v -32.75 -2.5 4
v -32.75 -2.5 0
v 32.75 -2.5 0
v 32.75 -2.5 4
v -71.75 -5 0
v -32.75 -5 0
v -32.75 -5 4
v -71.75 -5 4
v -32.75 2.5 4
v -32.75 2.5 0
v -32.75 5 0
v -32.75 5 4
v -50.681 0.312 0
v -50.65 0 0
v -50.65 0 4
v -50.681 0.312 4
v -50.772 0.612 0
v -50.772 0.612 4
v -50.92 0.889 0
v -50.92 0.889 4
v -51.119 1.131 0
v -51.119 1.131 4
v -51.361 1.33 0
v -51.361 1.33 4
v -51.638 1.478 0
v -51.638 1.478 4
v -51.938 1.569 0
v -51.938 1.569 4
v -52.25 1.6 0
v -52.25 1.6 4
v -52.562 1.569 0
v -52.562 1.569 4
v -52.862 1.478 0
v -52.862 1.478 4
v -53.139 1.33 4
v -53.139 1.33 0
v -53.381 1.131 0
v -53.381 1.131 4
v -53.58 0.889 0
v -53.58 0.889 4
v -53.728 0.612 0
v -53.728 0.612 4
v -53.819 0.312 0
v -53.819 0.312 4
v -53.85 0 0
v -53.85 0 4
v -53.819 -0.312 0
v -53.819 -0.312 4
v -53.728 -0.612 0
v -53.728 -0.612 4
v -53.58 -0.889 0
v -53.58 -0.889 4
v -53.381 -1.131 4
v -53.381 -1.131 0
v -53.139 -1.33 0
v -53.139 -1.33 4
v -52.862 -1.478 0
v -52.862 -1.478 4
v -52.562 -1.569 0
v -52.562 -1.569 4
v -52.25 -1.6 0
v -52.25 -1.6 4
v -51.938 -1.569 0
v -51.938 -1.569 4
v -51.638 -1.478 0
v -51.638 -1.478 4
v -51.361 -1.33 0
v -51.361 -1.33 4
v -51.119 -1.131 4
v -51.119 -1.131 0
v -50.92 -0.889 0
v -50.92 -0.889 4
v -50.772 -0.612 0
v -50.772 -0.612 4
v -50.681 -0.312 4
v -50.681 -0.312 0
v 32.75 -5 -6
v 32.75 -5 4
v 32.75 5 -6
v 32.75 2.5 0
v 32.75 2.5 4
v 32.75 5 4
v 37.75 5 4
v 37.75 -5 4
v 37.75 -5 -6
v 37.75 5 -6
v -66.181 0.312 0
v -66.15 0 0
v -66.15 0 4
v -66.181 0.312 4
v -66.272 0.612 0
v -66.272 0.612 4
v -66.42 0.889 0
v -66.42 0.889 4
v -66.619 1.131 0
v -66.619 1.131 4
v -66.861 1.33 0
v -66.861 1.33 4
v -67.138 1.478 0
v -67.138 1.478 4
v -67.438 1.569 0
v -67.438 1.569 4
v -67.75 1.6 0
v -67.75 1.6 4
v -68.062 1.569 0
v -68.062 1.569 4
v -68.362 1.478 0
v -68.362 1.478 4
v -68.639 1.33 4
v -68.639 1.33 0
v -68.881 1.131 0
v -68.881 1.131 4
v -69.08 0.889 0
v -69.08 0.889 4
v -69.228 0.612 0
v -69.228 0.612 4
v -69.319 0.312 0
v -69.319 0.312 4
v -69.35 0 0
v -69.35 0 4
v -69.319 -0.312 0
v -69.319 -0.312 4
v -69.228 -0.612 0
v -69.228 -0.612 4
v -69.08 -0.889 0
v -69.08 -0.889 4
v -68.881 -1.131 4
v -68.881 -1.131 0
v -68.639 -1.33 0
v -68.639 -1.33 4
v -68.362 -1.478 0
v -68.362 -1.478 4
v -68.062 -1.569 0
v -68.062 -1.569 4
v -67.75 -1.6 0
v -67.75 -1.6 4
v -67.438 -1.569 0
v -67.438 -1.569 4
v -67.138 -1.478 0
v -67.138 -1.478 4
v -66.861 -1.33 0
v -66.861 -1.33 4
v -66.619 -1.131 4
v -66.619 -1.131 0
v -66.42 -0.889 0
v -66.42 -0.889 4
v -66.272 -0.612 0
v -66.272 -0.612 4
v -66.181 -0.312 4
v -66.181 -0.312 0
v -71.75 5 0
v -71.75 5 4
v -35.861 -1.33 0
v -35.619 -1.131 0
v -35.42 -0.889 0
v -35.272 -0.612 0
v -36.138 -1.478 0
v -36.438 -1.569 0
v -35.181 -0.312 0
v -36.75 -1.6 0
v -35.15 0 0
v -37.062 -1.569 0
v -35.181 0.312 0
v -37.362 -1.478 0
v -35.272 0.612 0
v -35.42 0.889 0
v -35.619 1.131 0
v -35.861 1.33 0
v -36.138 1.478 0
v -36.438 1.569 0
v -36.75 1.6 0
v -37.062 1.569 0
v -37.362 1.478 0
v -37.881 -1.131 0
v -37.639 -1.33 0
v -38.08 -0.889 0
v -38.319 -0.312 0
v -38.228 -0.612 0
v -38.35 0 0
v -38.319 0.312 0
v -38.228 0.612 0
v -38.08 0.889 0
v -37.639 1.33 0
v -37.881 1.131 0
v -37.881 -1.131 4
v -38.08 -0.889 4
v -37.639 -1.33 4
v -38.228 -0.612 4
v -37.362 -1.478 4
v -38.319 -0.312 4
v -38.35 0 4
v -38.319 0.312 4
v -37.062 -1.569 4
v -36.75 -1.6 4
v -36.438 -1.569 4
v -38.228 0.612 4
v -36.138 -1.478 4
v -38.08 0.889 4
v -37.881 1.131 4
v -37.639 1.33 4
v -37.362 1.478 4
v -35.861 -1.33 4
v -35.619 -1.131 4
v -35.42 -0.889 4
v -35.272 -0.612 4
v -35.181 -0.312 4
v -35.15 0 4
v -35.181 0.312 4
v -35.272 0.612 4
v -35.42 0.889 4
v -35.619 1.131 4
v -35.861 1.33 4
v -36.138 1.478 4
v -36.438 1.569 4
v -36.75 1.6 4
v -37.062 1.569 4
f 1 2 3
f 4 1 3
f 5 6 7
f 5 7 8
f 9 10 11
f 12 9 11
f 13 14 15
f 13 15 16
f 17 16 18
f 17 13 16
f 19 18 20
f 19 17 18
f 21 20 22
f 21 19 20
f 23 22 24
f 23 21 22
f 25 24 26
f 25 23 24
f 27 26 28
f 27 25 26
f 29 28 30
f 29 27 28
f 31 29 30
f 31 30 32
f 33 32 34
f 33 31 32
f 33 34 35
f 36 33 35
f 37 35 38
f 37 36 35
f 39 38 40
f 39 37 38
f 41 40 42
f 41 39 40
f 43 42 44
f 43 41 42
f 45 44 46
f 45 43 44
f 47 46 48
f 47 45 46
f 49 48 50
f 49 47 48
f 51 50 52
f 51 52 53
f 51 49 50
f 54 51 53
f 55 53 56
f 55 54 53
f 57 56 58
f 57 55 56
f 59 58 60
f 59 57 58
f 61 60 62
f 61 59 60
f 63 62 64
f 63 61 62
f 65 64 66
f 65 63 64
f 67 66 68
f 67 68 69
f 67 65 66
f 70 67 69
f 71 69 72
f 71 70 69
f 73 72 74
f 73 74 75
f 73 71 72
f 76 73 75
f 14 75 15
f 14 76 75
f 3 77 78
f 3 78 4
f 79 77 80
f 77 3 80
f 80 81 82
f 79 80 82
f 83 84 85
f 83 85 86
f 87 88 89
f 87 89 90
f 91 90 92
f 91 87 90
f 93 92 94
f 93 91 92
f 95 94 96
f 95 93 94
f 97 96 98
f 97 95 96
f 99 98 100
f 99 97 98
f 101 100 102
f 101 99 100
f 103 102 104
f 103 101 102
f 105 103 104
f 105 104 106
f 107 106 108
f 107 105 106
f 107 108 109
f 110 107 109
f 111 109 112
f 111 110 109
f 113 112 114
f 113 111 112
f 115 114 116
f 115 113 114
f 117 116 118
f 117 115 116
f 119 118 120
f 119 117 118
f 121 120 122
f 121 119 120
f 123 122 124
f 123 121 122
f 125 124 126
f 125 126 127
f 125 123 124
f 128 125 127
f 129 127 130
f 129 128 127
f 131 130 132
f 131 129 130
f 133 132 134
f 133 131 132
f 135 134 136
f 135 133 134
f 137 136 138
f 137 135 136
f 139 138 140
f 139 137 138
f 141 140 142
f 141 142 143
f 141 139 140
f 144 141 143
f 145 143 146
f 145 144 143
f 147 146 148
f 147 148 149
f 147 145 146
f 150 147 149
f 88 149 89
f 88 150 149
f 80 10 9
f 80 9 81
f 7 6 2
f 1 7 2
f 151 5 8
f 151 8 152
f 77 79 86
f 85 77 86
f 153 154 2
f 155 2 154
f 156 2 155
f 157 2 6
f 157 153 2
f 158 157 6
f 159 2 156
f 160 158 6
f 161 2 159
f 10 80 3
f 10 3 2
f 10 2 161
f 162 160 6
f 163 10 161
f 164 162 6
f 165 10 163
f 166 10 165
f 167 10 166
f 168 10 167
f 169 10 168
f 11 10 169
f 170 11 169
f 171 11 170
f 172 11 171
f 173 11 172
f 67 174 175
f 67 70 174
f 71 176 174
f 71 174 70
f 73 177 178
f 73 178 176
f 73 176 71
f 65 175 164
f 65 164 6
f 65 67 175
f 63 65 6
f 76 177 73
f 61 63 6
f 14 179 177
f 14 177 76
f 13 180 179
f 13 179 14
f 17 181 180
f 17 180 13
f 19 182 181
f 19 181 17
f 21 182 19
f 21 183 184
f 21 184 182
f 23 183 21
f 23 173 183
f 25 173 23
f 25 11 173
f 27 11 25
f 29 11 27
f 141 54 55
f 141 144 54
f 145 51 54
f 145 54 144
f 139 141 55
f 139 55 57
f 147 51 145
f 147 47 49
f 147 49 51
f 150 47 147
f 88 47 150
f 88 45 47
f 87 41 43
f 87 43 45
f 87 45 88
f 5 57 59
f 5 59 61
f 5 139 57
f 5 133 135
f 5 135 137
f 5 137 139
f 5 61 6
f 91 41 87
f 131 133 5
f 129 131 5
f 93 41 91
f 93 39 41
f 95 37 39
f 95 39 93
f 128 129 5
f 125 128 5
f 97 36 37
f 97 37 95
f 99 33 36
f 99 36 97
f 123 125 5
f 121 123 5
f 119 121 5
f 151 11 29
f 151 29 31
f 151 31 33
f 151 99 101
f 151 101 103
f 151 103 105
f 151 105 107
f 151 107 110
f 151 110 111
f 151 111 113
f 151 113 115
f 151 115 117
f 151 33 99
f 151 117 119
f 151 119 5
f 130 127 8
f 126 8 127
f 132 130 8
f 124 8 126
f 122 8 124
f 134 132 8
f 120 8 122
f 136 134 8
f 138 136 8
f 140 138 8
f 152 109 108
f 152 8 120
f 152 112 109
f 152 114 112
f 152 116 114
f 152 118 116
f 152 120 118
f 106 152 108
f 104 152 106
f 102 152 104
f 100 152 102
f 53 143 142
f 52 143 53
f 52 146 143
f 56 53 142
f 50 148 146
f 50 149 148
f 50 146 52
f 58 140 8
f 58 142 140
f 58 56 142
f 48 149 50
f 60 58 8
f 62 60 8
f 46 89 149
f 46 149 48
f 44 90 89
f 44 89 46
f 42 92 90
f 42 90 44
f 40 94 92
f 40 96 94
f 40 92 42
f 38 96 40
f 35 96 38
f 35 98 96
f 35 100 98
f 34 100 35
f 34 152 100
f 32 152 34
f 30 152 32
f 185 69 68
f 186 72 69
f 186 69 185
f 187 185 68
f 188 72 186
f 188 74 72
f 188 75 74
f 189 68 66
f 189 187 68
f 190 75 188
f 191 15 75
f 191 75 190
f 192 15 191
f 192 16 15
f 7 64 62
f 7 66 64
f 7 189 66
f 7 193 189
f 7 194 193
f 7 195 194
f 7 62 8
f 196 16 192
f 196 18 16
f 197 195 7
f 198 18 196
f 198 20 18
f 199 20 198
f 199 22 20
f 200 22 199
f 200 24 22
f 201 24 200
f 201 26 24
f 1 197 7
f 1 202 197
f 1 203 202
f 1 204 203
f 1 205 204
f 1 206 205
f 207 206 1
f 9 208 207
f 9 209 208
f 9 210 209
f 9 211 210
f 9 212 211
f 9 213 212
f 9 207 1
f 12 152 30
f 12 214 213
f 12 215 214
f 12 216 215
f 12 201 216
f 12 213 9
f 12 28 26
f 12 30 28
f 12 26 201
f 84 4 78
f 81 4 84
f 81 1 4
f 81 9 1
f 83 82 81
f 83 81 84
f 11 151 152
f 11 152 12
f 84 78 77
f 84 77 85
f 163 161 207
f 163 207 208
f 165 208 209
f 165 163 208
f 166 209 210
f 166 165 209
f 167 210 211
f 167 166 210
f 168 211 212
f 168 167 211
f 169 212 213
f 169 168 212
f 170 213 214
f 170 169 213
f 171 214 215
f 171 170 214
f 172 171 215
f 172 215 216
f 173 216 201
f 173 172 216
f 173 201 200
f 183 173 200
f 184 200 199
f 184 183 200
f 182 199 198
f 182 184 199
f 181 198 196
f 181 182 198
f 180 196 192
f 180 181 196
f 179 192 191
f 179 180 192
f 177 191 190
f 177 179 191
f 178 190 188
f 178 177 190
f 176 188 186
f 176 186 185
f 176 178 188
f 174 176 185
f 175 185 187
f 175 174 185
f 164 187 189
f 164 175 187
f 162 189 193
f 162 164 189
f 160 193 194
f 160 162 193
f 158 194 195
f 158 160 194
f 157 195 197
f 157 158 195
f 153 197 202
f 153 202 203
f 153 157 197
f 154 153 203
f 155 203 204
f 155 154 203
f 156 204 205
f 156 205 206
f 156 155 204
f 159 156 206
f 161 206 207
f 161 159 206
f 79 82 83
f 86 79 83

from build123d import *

# Parameters (mm, degrees)
ESBO_O1_R                = 1.6
ESBO_O1_W                = 65.5
ESBO_O1_H                = 5
RESSALTO_EXTRUS_O1_DEPTH = 4
ESBO_O2_W                = 5
ESBO_O2_H                = 10
RESSALTO_EXTRUS_O2_DEPTH = 10


with BuildPart() as part:
    # Esboço1 → Ressalto-extrusão1 (new body)
    with BuildSketch(Plane.XY):
        Polygon((-32.75, -2.5), (-32.75, -5), (-71.75, -5), (-71.75, 5), (-32.75, 5), (-32.75, 2.5), align=None)
        with Locations((-52.25, 0)):
            Circle(ESBO_O1_R, mode=Mode.SUBTRACT)
        with Locations((-67.75, 0)):
            Circle(ESBO_O1_R, mode=Mode.SUBTRACT)
        with Locations((-36.75, 0)):
            Circle(ESBO_O1_R, mode=Mode.SUBTRACT)
        Rectangle(ESBO_O1_W, ESBO_O1_H)
    extrude(amount=RESSALTO_EXTRUS_O1_DEPTH)

    # Esboço2 → Ressalto-extrusão2 (add)
    with BuildSketch(Plane.XY.offset(4)):
        with Locations((35.25, 0)):
            Rectangle(ESBO_O2_W, ESBO_O2_H)
    extrude(amount=-RESSALTO_EXTRUS_O2_DEPTH)


solid = part.part
